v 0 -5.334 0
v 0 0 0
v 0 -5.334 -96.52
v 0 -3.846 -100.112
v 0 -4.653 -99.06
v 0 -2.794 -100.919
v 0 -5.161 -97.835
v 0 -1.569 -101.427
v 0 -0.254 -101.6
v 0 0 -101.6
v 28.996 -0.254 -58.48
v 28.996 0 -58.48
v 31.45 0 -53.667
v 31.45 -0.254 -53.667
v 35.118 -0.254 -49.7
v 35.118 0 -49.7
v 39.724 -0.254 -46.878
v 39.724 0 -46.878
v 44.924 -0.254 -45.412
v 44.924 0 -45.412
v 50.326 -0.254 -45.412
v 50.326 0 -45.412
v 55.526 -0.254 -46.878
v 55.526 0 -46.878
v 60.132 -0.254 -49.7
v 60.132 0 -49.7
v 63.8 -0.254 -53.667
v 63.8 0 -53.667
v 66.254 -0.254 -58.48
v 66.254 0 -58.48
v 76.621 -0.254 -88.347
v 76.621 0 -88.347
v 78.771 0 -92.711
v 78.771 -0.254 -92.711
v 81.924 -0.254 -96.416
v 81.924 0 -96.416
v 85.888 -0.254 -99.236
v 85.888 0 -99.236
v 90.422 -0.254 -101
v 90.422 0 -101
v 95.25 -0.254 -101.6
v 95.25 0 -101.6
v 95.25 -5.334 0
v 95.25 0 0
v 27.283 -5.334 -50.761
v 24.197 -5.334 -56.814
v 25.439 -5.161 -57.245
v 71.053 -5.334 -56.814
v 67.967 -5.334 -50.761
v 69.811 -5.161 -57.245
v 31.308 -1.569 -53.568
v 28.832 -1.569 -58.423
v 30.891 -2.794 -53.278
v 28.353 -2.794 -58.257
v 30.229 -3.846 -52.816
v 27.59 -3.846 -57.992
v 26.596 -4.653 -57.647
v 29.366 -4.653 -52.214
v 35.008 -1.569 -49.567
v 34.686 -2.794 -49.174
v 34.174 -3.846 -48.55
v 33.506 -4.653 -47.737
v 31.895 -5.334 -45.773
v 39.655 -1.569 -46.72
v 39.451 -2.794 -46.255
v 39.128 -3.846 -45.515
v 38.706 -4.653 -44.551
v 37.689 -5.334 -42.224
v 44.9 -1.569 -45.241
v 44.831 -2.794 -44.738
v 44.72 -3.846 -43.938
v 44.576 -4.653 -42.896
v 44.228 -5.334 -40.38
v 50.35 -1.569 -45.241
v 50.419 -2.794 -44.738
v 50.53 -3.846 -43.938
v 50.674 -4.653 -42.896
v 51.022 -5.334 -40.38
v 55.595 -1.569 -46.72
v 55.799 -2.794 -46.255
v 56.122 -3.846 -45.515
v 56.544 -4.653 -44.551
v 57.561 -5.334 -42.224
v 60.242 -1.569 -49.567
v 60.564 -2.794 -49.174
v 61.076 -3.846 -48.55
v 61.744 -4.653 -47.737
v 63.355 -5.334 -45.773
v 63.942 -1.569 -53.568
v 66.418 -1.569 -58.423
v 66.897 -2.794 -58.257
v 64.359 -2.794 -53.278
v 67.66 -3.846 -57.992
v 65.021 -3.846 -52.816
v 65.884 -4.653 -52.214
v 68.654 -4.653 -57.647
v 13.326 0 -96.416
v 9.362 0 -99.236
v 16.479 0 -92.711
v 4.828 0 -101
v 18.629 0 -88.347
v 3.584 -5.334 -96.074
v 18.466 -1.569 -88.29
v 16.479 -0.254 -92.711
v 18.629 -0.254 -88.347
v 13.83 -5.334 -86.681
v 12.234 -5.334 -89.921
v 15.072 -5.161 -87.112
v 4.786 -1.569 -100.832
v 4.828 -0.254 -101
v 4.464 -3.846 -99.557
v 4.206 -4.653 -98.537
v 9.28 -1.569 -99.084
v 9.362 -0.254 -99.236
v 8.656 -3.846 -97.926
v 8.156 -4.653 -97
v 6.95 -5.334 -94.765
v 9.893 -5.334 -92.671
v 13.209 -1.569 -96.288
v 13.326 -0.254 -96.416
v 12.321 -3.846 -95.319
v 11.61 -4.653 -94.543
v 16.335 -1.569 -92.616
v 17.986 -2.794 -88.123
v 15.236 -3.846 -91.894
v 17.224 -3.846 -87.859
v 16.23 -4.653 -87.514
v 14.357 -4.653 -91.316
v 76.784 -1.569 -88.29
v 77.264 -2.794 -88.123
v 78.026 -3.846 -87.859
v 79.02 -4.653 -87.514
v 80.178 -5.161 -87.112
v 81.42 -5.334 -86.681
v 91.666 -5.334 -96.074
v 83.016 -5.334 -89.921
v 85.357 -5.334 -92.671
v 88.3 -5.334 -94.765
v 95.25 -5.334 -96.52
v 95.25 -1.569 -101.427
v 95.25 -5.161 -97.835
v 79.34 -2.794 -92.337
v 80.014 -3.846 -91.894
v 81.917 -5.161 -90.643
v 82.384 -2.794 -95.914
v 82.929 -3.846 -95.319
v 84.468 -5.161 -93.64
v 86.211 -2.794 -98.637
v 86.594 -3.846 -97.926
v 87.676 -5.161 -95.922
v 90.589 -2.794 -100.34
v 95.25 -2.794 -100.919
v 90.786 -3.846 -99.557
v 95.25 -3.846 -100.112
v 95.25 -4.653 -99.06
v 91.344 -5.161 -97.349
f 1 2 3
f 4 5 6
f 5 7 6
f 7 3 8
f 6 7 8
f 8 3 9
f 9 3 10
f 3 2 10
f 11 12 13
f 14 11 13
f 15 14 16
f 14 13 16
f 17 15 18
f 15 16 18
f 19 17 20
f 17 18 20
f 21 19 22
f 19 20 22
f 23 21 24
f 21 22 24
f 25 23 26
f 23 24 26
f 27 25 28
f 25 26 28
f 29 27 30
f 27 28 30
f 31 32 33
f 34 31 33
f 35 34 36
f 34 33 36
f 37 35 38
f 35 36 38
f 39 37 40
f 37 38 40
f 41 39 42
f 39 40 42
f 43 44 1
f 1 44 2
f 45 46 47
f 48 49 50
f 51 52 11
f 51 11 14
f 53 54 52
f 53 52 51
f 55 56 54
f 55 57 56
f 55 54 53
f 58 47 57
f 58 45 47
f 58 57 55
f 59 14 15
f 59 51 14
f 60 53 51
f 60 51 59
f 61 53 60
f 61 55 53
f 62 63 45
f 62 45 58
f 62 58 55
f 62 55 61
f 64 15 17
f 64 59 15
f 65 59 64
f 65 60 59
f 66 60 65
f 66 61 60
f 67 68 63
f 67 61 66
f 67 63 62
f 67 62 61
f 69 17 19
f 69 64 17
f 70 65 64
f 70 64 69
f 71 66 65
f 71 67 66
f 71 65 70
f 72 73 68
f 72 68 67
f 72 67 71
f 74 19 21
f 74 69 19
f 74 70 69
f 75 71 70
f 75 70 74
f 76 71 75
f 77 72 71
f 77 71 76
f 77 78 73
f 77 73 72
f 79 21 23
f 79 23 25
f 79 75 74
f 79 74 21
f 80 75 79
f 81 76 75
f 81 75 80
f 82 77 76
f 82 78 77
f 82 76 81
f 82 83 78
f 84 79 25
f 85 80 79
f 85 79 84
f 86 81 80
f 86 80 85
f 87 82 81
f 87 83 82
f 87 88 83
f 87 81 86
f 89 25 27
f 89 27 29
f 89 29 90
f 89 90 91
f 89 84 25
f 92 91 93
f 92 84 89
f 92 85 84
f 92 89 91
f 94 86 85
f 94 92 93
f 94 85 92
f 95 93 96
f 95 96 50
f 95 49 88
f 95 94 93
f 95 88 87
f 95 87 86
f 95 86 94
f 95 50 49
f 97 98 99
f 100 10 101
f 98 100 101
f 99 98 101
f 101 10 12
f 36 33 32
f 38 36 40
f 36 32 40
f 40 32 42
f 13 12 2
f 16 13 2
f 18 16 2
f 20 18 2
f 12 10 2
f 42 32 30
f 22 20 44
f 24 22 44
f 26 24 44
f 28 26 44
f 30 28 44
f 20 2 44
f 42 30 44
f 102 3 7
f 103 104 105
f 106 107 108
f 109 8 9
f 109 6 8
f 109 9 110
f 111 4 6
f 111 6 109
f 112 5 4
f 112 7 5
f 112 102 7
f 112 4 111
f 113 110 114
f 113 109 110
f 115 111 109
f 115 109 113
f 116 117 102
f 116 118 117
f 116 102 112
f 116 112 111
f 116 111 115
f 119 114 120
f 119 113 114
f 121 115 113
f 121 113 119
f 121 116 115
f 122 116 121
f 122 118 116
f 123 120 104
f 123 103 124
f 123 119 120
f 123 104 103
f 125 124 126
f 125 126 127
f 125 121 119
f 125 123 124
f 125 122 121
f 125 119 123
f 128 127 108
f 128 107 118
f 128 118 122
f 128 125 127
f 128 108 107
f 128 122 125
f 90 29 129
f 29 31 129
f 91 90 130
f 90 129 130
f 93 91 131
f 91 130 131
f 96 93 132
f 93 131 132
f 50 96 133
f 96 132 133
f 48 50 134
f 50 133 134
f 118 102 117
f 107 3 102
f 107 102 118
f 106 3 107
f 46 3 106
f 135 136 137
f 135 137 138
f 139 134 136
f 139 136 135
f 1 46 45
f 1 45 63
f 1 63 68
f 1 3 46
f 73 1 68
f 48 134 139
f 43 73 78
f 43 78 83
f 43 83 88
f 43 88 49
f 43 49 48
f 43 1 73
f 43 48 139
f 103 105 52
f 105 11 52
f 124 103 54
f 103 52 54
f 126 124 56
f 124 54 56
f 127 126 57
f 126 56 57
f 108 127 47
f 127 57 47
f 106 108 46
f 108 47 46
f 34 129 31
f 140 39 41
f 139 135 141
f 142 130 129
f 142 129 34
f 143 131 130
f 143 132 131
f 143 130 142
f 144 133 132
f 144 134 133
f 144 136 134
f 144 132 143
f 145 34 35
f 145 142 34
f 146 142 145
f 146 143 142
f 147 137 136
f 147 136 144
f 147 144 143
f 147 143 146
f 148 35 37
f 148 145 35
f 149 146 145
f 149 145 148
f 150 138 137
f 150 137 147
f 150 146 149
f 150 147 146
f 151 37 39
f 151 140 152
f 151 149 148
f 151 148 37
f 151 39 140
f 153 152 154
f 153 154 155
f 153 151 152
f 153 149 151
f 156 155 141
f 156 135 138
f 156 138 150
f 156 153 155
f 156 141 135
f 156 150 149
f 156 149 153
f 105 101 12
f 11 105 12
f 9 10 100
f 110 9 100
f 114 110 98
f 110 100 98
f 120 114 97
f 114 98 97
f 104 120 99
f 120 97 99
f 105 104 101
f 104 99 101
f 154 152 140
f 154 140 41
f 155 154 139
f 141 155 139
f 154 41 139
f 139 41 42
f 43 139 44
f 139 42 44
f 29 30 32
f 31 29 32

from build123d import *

# Parameters (mm, degrees)
F1_DEPTH = 5.334
F2_R     = 5.08


with BuildPart() as f1:
    # F0 (on Front) → F1 (new body)
    with BuildSketch(Plane.XZ):
        with BuildLine():
            Line((95.25, 0), (0, 0))
            Line((0, 0), (0, -101.6))
            ThreePointArc((0, -101.6), (11.431352, -97.948571), (18.629252, -88.346542))
            Line((18.629252, -88.346542), (28.995748, -58.479743))
            ThreePointArc((28.995748, -58.479743), (47.625, -45.226285), (66.254252, -58.479743))
            Line((66.254252, -58.479743), (76.620748, -88.346542))
            ThreePointArc((76.620748, -88.346542), (83.818648, -97.948571), (95.25, -101.6))
            Line((95.25, -101.6), (95.25, 0))
        make_face()
    extrude(amount=F1_DEPTH)

    # F2
    f2_edges = [f1.edges().sort_by_distance(p)[0] for p in [
        (11.431352, -5.334, -97.948571),
    ]]
    fillet(f2_edges, radius=F2_R)


solid = f1.part
